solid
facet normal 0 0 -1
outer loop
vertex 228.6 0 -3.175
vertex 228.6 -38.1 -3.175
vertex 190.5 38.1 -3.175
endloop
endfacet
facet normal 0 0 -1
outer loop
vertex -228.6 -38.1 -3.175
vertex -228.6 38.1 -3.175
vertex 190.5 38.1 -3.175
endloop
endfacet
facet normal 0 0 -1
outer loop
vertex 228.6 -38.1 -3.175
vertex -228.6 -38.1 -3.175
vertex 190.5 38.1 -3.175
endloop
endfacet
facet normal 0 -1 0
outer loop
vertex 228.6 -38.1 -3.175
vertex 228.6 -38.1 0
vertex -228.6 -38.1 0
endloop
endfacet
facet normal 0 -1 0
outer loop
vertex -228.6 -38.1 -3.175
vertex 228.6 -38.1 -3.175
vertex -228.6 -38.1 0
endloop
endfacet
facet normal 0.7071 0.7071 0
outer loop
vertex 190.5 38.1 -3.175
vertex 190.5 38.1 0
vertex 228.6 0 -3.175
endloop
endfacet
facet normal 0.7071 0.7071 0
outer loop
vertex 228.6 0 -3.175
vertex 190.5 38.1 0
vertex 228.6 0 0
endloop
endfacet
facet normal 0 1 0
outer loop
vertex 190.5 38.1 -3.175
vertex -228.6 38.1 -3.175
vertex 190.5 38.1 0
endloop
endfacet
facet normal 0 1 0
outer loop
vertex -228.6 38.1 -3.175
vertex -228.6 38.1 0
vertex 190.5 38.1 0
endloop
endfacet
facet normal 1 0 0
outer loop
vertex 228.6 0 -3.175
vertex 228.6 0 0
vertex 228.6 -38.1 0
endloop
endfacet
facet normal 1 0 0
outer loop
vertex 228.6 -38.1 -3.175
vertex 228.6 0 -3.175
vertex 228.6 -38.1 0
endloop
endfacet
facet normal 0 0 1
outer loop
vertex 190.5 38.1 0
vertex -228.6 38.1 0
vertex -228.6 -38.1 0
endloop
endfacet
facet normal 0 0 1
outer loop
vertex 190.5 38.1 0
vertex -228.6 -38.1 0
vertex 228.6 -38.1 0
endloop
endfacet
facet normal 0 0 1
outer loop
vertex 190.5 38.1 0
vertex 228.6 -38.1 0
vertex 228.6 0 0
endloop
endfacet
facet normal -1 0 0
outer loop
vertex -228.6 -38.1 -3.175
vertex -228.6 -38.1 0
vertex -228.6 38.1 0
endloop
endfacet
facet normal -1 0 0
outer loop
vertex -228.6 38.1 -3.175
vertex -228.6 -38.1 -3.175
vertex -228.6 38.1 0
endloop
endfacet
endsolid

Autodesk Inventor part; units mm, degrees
ref_plane "YZ Plane" through (0, 0, 0) normal (1, 0, 0) x (0, 1, 0)
ref_plane "XZ Plane" through (0, 0, 0) normal (0, 1, 0) x (-1, 0, 0)
ref_plane "XY Plane" through (0, 0, 0) normal (0, 0, 1) x (1, 0, 0)
sketch "Sketch1" plane through (0, 0, 0) normal (0, 0, 1) x (1, 0, 0)
  line L0 (-228.6, 38.1) -> (190.5, 38.1)
  line L1 (228.6, 0) -> (228.6, -38.1)
  line L2 (228.6, -38.1) -> (-228.6, -38.1)
  line L3 (-228.6, -38.1) -> (-228.6, 38.1)
  line L4 (190.5, 38.1) -> (228.6, 0)
  point P0 (0, 0)
  dimension "d1" = 76.2
  dimension "d2" = 38.1
  dimension "d3" = 228.6
  dimension "d6" = 38.1
  dimension "d7" = 45
  dimension "d8" = 457.2
extrude "Extrusion1" add sketch "Sketch1" against normal blind 3.175
properties part number "Side_Panel"
